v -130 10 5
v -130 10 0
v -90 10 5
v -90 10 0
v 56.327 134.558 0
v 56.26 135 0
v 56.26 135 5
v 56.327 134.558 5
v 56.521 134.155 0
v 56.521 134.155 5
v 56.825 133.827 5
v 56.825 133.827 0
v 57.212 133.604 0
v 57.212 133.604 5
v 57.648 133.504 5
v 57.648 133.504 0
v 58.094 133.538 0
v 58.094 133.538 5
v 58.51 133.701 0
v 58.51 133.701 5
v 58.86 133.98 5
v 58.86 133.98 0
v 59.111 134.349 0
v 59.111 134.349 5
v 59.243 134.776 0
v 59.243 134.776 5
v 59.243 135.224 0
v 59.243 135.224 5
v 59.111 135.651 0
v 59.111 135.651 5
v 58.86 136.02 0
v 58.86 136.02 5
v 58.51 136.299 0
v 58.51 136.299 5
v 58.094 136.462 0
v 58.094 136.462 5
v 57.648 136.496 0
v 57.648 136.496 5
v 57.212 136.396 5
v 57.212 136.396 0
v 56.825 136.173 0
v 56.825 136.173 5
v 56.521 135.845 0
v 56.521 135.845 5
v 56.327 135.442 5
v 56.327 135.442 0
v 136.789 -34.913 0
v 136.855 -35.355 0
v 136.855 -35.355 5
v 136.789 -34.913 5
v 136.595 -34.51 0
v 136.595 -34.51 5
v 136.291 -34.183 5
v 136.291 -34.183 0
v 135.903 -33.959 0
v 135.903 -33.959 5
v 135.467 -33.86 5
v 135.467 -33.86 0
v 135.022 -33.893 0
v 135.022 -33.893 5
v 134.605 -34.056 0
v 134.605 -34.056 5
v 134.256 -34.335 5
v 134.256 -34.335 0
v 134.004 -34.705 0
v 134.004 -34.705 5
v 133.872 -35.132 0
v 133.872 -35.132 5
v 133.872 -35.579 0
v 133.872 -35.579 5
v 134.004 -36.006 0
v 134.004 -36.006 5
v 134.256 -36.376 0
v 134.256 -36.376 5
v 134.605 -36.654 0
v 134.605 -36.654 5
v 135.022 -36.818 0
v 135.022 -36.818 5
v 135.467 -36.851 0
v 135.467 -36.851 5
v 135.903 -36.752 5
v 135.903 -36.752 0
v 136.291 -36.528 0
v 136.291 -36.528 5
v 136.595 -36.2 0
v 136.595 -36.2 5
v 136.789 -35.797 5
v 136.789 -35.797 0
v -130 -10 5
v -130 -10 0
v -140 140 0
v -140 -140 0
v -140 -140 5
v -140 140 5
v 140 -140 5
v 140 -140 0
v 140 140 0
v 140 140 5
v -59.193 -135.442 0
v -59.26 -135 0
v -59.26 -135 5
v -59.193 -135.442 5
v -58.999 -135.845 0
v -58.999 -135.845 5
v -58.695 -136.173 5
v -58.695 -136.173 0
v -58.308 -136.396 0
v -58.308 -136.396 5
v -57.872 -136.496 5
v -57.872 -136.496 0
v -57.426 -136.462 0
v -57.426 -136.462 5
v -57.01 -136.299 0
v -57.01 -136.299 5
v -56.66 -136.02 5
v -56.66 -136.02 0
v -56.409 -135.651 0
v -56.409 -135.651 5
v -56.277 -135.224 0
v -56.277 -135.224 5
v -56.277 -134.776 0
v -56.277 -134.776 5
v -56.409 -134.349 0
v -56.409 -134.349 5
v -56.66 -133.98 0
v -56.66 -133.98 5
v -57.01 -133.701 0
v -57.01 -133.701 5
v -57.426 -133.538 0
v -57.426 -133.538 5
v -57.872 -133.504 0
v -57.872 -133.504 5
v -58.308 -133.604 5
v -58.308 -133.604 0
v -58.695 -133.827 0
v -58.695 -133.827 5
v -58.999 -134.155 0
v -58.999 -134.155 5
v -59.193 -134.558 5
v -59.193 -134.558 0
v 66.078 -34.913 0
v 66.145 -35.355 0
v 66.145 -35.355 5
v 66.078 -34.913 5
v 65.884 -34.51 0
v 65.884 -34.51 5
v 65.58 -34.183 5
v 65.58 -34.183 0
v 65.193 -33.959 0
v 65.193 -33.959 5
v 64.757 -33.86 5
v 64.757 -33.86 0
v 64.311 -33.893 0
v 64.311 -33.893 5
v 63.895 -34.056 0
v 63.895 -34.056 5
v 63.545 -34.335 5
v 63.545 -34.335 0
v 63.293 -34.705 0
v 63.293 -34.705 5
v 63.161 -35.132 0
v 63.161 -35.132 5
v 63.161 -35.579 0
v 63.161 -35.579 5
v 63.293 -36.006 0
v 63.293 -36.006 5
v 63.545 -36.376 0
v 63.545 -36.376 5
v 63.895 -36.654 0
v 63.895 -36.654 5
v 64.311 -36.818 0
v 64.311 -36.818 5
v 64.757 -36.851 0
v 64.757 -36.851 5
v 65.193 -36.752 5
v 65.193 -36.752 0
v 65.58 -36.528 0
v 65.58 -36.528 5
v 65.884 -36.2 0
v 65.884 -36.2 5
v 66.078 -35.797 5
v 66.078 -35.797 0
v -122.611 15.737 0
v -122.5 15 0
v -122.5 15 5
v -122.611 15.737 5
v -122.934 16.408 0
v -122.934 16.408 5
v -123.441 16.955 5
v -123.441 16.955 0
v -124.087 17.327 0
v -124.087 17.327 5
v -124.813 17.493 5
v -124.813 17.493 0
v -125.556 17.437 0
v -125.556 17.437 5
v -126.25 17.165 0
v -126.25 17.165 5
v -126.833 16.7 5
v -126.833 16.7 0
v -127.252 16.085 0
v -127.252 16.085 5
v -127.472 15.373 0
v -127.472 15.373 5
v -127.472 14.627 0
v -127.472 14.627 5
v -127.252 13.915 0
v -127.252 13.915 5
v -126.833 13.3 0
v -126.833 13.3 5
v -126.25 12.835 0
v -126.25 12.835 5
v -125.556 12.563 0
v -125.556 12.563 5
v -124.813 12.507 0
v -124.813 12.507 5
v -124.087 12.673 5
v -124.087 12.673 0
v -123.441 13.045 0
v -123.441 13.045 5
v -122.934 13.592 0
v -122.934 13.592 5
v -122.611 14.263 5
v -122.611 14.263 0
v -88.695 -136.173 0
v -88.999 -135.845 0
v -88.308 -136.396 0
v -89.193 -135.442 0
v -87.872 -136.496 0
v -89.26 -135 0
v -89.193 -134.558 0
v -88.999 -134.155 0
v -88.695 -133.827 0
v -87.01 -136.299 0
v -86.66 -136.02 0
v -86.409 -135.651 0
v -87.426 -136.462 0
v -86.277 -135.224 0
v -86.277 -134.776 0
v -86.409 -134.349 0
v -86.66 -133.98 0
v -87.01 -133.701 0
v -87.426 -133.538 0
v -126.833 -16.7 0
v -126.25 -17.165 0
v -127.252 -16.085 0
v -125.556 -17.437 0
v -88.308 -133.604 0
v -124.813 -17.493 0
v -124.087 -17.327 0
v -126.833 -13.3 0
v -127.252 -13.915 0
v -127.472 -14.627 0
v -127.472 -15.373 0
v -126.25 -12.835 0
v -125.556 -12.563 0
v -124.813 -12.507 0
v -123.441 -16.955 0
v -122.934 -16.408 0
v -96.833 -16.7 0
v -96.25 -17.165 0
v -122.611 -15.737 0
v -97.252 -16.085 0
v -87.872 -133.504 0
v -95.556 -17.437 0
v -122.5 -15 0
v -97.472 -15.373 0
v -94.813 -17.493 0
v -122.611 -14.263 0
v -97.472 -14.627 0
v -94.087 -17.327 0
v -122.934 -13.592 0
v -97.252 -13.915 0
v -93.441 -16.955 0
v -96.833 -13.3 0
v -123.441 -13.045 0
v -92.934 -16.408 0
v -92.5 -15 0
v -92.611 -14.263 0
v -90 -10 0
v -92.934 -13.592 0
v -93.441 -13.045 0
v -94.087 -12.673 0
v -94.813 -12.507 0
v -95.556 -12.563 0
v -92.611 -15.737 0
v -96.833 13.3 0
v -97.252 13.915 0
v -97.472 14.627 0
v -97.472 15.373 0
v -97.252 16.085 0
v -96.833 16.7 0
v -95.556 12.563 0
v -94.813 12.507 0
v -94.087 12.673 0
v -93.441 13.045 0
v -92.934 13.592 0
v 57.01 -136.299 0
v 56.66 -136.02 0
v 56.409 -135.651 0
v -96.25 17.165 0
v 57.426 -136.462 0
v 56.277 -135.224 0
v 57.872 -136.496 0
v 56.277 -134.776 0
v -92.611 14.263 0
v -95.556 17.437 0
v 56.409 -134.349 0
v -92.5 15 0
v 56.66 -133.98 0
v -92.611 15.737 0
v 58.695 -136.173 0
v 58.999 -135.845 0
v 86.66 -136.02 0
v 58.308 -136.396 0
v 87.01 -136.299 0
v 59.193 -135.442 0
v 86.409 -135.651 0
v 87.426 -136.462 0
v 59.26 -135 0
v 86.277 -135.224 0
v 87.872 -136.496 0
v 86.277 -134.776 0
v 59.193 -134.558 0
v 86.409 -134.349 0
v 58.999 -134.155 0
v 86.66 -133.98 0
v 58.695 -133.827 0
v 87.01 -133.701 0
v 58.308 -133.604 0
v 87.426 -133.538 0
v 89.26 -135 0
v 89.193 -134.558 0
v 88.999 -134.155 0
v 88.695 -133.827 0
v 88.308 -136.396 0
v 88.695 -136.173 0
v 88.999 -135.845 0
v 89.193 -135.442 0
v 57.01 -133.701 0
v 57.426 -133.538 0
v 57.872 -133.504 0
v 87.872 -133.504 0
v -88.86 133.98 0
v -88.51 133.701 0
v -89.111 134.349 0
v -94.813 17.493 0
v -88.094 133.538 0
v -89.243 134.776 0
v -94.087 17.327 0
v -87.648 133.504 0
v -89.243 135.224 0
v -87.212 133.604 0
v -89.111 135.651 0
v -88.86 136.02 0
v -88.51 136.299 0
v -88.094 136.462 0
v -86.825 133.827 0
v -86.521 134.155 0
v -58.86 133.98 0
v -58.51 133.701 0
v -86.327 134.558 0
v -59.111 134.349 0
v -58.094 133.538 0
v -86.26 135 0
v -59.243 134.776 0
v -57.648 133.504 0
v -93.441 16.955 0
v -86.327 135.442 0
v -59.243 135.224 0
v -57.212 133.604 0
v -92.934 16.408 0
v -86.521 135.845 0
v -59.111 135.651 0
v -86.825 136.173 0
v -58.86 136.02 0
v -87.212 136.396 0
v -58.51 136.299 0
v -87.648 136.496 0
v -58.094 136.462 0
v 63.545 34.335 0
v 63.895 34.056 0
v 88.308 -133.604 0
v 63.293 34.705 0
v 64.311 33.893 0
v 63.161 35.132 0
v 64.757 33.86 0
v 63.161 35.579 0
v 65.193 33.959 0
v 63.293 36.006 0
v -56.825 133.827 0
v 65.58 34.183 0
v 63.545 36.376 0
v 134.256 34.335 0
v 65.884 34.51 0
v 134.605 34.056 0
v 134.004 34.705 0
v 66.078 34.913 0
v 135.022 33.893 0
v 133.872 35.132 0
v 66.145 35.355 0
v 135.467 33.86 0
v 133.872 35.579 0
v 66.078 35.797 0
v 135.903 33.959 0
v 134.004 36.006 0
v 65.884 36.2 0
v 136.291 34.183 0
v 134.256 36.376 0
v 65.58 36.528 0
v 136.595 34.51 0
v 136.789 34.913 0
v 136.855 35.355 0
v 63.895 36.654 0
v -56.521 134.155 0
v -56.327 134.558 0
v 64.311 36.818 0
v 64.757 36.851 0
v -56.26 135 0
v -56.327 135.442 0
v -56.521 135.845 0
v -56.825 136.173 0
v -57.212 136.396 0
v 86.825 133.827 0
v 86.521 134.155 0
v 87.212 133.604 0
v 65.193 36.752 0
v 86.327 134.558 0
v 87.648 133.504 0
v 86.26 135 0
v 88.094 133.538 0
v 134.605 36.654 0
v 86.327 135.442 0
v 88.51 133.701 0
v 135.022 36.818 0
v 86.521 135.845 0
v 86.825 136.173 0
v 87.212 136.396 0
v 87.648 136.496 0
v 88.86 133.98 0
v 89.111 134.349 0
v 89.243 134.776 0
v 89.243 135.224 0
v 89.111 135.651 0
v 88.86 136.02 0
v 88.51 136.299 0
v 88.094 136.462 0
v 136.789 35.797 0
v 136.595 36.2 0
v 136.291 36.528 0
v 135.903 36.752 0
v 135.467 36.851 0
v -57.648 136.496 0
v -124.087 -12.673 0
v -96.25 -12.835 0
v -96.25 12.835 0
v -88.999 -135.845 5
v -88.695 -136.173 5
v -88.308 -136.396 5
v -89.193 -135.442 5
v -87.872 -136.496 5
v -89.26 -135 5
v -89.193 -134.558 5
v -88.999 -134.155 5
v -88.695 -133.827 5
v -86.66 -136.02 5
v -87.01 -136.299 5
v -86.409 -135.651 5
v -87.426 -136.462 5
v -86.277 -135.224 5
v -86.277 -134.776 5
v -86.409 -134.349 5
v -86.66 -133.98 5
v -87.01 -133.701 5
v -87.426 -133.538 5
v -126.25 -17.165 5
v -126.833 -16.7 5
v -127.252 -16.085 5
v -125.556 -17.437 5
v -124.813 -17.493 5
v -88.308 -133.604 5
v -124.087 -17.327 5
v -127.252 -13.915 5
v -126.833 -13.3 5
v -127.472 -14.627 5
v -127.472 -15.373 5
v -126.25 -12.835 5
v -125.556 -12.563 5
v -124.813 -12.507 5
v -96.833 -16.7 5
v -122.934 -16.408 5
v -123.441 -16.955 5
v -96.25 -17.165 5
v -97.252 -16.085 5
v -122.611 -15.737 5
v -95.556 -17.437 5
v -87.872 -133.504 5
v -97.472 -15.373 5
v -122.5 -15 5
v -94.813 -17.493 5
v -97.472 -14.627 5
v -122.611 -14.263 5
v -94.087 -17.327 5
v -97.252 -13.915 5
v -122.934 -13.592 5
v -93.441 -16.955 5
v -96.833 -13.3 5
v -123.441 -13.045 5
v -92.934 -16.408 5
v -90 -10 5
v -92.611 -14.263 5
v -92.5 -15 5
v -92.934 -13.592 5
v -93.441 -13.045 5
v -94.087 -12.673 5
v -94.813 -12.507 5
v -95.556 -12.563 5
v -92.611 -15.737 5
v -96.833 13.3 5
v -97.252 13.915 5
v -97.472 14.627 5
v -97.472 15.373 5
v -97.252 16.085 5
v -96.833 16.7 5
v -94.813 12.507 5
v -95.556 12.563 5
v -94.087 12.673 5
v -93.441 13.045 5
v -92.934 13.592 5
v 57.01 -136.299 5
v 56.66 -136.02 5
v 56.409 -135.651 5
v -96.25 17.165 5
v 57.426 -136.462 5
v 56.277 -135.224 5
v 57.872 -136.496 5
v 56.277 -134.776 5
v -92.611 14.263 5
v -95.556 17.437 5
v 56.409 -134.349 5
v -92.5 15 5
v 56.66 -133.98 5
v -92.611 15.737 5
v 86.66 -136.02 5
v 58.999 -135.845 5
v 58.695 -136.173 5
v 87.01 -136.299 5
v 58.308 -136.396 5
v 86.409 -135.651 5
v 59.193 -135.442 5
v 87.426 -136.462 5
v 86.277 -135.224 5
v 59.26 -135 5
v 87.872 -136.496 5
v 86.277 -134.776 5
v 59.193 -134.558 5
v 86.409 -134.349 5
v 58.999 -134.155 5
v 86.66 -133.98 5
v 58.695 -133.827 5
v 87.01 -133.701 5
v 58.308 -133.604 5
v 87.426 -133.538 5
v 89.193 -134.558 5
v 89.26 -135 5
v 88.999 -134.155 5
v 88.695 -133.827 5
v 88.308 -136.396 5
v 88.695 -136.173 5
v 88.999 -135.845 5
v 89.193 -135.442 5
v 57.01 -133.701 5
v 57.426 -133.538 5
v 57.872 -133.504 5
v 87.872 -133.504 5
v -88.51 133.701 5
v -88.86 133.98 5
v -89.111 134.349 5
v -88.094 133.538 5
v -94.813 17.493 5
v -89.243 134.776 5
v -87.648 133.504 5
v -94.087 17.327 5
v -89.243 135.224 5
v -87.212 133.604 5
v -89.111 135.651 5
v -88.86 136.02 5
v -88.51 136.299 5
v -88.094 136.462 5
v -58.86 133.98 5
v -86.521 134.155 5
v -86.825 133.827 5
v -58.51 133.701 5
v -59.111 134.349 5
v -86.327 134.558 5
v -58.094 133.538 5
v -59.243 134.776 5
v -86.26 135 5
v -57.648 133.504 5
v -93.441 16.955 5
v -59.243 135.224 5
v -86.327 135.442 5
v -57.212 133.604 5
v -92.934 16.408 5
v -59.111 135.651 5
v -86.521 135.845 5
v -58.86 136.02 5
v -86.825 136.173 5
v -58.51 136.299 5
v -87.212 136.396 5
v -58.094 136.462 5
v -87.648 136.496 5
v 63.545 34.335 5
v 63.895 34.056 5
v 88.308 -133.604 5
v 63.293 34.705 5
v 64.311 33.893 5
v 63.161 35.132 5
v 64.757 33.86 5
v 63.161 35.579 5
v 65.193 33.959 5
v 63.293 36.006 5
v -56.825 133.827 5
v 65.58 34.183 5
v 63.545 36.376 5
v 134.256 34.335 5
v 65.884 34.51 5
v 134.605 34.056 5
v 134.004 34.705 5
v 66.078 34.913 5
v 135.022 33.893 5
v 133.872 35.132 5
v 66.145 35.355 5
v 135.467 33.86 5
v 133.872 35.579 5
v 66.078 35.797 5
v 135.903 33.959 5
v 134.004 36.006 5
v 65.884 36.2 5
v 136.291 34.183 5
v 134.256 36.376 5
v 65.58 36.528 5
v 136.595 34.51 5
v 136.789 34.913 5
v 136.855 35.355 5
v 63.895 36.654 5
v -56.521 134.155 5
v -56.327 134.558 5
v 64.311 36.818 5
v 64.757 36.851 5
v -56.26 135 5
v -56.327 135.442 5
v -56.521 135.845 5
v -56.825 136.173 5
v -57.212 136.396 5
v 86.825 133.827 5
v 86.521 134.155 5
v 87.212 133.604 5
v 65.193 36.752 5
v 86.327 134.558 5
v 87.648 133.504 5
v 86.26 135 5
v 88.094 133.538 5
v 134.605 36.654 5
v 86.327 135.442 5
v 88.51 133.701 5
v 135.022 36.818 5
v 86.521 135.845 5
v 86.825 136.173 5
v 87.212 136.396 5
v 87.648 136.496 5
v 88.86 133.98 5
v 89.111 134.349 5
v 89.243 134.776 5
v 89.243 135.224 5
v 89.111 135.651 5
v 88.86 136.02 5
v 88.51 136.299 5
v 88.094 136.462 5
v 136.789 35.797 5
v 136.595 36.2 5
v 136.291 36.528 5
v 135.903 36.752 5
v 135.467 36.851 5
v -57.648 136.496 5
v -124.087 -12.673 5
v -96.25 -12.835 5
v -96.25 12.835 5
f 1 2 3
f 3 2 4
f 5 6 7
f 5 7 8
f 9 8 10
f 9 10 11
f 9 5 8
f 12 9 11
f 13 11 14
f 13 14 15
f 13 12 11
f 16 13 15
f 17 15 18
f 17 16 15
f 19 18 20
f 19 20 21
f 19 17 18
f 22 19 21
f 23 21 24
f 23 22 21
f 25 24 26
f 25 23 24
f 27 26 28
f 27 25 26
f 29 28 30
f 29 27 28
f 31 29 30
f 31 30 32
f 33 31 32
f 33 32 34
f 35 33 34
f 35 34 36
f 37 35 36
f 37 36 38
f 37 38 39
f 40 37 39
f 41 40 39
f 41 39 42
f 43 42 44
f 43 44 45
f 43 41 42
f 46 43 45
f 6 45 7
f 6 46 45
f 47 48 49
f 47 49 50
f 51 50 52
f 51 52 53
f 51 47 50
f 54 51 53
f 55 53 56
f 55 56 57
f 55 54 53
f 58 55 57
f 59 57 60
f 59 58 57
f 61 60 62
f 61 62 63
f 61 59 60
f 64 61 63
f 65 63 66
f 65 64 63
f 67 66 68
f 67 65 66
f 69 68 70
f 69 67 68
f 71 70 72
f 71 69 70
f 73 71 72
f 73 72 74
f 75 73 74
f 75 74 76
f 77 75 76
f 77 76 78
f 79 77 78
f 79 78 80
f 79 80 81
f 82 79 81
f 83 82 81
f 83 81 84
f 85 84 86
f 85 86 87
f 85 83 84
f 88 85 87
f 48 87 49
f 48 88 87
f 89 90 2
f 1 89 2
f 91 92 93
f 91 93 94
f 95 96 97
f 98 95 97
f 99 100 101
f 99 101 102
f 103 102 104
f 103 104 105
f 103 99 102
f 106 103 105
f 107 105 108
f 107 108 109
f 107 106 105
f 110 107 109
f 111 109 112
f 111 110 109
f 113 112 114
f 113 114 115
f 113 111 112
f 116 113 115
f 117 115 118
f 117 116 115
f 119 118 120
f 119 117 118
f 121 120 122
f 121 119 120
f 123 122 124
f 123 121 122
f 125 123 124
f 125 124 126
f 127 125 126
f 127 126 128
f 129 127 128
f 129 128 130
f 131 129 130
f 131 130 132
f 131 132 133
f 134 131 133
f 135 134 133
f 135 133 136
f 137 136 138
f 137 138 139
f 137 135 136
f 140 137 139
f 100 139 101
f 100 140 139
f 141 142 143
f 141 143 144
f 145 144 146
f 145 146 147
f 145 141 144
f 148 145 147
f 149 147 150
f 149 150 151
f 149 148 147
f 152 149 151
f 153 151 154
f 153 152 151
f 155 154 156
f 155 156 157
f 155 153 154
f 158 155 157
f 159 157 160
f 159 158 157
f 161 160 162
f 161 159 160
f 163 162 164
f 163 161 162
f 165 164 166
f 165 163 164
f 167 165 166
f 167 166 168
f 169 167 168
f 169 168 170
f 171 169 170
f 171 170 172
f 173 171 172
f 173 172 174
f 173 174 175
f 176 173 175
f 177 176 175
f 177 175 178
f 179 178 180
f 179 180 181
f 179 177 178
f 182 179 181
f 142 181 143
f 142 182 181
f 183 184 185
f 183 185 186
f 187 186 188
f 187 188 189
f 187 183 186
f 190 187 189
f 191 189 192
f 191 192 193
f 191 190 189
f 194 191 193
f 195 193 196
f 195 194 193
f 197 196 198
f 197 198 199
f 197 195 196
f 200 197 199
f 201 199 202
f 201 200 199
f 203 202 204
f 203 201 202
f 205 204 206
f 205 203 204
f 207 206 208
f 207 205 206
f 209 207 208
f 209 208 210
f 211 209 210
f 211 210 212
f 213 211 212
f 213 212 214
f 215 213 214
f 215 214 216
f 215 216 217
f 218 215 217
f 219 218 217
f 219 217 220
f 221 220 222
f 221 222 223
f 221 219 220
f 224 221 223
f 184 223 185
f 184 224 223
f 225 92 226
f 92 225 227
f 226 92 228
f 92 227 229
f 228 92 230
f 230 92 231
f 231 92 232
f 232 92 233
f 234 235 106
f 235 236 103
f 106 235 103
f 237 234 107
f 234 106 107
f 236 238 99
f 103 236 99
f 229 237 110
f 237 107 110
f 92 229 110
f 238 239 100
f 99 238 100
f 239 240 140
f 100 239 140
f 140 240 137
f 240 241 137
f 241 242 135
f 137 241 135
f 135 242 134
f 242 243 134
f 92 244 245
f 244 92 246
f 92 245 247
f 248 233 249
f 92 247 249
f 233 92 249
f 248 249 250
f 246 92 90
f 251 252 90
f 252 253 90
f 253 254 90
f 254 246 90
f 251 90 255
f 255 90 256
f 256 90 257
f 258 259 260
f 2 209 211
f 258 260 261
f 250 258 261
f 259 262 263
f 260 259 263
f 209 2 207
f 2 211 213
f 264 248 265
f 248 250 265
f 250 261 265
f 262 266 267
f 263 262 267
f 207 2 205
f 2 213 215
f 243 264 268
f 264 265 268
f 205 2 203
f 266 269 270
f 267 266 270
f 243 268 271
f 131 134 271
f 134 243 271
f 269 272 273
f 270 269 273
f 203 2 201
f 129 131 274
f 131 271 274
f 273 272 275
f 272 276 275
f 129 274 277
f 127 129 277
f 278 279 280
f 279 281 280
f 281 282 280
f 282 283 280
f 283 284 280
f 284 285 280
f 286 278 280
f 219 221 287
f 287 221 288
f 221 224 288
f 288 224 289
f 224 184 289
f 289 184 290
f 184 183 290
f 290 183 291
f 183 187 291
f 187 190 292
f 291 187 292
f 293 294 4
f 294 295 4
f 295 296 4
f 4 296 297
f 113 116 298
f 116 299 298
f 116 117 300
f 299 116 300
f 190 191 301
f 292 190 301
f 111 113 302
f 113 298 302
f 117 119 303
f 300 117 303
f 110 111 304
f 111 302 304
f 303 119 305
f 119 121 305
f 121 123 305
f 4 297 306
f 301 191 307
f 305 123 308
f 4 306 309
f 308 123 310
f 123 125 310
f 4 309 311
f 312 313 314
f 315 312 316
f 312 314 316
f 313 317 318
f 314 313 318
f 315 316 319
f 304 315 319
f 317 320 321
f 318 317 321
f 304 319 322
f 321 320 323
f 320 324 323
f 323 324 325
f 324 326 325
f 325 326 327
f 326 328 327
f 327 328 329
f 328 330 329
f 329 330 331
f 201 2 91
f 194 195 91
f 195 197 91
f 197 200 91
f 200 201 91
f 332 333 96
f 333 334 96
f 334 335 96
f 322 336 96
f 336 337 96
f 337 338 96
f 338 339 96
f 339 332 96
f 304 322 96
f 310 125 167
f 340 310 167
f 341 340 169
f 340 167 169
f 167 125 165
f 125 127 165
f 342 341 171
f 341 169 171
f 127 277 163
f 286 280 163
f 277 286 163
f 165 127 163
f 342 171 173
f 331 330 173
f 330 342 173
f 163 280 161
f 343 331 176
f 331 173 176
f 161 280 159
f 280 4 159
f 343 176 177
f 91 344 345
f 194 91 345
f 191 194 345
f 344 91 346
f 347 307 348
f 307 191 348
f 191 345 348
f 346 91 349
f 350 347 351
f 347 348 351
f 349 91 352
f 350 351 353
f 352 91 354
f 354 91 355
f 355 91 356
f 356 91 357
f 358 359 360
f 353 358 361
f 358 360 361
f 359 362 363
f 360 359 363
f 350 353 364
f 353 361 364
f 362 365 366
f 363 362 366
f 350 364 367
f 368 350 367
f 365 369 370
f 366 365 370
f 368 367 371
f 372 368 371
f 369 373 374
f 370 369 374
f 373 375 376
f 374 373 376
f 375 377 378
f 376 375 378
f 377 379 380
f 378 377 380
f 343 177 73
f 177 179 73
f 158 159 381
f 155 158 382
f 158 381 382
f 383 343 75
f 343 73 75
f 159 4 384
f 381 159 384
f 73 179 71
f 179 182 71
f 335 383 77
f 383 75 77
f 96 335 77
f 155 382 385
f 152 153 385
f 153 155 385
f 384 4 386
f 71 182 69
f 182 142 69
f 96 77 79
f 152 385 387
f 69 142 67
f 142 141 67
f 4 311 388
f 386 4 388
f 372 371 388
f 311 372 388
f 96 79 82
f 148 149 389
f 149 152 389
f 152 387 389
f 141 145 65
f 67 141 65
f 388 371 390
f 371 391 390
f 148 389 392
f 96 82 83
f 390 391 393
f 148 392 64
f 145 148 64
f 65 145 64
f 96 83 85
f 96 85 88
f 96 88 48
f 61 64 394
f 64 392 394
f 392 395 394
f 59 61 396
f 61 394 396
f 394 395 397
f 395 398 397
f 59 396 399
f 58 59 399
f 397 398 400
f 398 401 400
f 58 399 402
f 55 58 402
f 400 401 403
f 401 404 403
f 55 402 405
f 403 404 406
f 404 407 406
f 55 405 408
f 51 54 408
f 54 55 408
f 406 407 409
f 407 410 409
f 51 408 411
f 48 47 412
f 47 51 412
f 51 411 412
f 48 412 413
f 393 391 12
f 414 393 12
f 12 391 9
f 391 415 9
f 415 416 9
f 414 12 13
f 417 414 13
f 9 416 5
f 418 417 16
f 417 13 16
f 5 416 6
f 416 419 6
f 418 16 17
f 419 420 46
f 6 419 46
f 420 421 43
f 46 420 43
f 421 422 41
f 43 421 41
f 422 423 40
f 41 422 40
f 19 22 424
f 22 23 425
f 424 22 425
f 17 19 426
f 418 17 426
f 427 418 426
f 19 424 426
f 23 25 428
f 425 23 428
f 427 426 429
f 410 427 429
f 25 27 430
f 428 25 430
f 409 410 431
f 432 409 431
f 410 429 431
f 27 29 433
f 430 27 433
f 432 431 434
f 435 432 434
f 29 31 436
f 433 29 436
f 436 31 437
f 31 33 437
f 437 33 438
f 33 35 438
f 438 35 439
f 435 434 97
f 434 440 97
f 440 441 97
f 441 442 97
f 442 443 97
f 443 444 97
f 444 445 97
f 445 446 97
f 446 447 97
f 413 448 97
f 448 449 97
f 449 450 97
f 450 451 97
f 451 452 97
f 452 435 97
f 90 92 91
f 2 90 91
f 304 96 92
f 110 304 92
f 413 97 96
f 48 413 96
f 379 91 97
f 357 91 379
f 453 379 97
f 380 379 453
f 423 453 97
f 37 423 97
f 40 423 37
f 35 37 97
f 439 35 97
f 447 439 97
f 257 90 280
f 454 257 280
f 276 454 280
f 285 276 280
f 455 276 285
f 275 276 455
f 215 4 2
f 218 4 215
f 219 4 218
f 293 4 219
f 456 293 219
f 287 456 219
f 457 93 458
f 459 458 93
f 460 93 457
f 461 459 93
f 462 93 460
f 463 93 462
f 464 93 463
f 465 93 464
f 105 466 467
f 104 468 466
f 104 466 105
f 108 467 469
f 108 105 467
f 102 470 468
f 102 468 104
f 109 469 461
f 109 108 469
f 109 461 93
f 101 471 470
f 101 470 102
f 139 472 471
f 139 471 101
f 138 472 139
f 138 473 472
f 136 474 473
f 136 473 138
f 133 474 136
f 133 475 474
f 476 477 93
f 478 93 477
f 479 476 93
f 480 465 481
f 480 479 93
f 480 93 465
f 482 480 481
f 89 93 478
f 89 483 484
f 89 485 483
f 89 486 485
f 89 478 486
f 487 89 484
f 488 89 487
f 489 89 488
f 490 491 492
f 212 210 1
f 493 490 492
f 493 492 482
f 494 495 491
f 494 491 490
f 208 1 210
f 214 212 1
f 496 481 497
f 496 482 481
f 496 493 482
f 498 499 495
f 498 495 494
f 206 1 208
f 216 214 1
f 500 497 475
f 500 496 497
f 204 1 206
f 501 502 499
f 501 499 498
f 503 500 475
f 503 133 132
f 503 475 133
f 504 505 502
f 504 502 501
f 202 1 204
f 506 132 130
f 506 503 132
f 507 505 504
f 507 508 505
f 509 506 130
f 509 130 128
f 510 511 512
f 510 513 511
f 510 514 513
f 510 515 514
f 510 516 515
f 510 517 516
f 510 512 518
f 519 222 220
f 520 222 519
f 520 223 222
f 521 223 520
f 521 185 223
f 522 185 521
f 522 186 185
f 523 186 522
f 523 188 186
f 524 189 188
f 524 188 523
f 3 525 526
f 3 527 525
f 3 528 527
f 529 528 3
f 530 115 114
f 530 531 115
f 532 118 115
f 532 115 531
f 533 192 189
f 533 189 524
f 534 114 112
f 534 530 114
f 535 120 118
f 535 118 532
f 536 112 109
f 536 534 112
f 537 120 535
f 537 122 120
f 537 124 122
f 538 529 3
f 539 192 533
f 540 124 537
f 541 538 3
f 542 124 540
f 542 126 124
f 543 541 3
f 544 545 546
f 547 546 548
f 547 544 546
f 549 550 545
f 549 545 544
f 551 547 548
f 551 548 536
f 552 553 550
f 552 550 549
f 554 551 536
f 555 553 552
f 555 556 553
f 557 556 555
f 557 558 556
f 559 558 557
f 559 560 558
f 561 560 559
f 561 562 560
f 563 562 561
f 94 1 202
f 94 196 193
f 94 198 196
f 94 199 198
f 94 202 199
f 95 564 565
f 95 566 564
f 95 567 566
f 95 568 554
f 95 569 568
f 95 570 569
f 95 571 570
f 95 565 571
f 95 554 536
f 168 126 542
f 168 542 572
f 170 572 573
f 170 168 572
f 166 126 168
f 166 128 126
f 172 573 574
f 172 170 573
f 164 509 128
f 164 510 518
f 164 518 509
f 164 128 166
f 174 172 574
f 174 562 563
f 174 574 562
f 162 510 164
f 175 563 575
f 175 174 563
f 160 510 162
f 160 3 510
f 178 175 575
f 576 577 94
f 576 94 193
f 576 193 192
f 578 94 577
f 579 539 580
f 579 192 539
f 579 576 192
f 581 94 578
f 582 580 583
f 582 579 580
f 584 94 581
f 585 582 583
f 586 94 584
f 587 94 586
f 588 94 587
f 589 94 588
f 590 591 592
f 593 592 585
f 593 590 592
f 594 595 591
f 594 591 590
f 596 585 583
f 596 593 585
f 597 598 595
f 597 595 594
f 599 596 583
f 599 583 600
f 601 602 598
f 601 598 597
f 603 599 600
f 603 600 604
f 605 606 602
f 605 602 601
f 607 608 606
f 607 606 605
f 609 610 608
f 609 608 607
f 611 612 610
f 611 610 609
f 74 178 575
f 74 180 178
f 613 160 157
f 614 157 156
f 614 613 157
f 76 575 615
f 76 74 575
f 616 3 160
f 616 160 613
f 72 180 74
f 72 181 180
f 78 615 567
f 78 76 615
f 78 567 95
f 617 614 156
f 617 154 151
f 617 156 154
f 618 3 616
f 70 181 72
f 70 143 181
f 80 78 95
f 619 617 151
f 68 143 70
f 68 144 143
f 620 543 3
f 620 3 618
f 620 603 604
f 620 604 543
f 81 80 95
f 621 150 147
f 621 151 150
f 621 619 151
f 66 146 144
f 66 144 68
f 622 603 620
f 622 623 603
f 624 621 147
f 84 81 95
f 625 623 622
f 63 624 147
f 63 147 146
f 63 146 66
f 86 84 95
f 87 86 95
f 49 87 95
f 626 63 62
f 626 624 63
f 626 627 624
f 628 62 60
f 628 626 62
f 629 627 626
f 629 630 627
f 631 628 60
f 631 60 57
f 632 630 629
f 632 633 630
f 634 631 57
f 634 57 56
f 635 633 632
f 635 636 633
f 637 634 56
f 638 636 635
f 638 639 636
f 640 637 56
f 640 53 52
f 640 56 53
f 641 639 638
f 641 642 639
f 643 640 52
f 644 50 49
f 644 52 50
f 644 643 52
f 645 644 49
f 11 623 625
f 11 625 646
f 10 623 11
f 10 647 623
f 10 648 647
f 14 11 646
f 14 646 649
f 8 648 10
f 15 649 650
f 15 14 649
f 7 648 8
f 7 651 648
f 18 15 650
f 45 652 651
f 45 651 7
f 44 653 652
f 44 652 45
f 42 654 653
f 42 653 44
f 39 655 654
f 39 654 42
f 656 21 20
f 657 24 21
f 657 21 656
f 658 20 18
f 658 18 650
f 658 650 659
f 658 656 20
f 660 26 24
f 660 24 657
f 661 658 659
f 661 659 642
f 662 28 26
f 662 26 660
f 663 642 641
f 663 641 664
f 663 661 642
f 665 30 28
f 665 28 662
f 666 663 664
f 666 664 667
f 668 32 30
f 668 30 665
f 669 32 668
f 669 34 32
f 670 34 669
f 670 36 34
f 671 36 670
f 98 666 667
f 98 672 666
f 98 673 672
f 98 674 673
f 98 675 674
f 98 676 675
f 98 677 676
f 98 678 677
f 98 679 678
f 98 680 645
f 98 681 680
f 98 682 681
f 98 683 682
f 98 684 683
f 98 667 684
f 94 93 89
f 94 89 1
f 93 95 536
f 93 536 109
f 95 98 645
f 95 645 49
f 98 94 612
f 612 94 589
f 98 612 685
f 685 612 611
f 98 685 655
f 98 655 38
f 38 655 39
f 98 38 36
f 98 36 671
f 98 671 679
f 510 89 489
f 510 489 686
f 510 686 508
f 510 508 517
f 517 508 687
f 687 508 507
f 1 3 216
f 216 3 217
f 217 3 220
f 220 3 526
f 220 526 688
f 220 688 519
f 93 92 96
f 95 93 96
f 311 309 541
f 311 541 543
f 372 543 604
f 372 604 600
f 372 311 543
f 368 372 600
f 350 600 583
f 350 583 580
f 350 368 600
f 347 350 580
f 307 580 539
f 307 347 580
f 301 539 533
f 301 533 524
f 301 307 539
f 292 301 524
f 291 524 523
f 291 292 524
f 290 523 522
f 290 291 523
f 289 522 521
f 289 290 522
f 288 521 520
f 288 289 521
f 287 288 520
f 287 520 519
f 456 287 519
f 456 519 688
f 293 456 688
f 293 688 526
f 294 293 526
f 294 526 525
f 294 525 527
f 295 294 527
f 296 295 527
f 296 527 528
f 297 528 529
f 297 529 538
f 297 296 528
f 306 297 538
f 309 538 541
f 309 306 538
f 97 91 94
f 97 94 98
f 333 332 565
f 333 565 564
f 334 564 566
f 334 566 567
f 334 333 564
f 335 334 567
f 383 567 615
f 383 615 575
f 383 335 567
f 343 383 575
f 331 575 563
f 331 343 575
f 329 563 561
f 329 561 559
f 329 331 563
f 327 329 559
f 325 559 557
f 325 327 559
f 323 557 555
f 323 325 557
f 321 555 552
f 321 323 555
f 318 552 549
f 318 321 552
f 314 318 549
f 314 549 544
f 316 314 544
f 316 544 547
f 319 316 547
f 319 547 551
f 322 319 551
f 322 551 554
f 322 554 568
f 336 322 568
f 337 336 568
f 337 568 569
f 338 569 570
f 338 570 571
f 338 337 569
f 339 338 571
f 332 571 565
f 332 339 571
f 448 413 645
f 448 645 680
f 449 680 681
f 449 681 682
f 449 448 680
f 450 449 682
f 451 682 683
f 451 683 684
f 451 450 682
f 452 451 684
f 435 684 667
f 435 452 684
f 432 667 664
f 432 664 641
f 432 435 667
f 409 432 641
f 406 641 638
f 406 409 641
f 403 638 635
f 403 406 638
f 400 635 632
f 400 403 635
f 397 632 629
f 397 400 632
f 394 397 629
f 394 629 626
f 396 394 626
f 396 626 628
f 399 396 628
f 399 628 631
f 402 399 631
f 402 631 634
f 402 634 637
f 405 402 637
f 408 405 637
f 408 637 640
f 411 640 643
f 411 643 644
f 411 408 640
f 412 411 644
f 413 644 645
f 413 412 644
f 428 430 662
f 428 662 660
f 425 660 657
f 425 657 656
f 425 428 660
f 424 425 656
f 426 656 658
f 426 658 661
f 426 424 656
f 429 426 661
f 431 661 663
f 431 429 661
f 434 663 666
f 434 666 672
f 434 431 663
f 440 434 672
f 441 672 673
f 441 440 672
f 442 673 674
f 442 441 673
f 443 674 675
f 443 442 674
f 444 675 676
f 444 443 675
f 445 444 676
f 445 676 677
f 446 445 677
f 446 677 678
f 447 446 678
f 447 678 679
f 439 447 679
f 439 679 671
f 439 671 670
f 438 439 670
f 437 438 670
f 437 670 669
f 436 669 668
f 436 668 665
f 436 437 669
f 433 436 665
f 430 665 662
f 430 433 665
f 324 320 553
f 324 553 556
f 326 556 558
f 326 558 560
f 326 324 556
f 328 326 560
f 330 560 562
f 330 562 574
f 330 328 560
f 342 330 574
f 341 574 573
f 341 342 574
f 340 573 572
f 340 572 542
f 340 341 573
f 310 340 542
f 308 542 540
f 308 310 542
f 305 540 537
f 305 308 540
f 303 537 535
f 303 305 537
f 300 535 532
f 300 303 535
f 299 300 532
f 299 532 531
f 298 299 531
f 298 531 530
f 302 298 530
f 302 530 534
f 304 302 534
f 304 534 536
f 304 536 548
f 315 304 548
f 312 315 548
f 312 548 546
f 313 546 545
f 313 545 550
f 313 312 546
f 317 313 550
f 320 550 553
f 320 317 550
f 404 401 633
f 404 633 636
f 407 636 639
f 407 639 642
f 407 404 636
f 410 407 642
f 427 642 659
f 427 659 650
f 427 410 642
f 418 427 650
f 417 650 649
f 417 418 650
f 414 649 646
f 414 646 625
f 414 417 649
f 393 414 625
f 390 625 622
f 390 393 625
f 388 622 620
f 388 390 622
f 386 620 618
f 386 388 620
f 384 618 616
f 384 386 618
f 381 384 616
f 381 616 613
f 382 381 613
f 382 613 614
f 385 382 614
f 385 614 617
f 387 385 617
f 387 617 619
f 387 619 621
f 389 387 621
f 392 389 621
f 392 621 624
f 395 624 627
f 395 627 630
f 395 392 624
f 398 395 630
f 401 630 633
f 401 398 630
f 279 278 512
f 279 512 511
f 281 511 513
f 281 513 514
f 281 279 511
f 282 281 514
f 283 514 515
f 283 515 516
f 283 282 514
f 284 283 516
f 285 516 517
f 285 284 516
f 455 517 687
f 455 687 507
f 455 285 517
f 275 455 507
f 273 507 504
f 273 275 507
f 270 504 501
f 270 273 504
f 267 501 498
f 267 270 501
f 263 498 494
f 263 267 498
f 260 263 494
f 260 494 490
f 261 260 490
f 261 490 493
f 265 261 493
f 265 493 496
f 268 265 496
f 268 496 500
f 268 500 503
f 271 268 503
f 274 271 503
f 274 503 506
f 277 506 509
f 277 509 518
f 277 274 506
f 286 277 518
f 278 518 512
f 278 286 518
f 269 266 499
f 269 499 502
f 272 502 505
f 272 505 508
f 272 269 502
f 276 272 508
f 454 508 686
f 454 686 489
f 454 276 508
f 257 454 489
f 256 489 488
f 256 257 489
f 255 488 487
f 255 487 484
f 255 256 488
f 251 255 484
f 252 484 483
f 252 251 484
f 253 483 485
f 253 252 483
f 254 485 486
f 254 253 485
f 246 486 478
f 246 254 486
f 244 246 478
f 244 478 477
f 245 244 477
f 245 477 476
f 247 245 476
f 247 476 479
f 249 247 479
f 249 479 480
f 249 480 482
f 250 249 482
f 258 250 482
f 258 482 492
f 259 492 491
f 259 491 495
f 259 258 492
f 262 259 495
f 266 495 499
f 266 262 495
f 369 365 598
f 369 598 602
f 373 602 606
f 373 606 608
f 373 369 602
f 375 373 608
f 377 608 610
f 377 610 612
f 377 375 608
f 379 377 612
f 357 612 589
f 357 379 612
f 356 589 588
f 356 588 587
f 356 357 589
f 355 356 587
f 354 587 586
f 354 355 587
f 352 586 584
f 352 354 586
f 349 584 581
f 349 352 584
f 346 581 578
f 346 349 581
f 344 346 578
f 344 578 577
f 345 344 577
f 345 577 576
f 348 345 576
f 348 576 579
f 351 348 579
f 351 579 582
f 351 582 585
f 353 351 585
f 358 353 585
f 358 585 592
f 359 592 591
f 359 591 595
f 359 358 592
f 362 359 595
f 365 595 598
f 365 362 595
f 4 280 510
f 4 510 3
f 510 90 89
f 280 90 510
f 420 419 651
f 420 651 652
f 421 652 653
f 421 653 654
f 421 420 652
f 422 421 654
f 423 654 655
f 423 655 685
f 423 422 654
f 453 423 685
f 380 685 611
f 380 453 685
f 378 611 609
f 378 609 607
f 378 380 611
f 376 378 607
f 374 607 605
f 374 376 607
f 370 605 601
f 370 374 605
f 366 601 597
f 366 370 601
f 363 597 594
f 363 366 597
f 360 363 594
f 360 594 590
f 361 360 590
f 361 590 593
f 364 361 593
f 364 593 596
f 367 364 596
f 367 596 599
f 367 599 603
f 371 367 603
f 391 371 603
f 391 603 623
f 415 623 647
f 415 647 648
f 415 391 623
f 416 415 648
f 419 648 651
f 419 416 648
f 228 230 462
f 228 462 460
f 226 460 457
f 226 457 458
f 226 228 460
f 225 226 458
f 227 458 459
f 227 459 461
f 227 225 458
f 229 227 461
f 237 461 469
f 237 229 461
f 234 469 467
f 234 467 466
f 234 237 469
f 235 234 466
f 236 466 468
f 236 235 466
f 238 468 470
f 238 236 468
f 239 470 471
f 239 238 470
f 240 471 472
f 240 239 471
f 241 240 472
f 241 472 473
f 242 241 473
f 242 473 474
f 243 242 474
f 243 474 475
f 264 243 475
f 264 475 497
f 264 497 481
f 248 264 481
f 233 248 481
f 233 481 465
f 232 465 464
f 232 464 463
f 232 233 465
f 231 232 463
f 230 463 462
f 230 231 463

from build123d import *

# Parameters (mm, degrees)
SKETCH_1_W      = 280
SKETCH_1_H      = 280
SKETCH_1_R      = 1.5
SKETCH_1_R_2    = 2.5
SKETCH_1_W_2    = 40
SKETCH_1_H_2    = 20
EXTRUDE_1_DEPTH = 5


with BuildPart() as part:
    # 草图1 → 凸台-拉伸1 (new body)
    with BuildSketch(Plane.XY):
        Rectangle(SKETCH_1_W, SKETCH_1_H)
        with Locations((-87.76, 135)):
            Circle(SKETCH_1_R, mode=Mode.SUBTRACT)
        with Locations((-57.76, 135)):
            Circle(SKETCH_1_R, mode=Mode.SUBTRACT)
        with Locations(Location((57.76, 135, 0), (0, 0, 180))):
            Circle(SKETCH_1_R, mode=Mode.SUBTRACT)
        with Locations(Location((87.76, 135, 0), (0, 0, 180))):
            Circle(SKETCH_1_R, mode=Mode.SUBTRACT)
        with Locations((87.76, -135)):
            Circle(SKETCH_1_R, mode=Mode.SUBTRACT)
        with Locations((57.76, -135)):
            Circle(SKETCH_1_R, mode=Mode.SUBTRACT)
        with Locations(Location((-57.76, -135, 0), (0, 0, 180))):
            Circle(SKETCH_1_R, mode=Mode.SUBTRACT)
        with Locations(Location((-87.76, -135, 0), (0, 0, 180))):
            Circle(SKETCH_1_R, mode=Mode.SUBTRACT)
        with Locations((64.644660941, 35.355339059)):
            Circle(SKETCH_1_R, mode=Mode.SUBTRACT)
        with Locations((135.355339059, 35.355339059)):
            Circle(SKETCH_1_R, mode=Mode.SUBTRACT)
        with Locations((64.644660941, -35.355339059)):
            Circle(SKETCH_1_R, mode=Mode.SUBTRACT)
        with Locations((135.355339059, -35.355339059)):
            Circle(SKETCH_1_R, mode=Mode.SUBTRACT)
        with Locations((-95, 15)):
            Circle(SKETCH_1_R_2, mode=Mode.SUBTRACT)
        with Locations((-125, 15)):
            Circle(SKETCH_1_R_2, mode=Mode.SUBTRACT)
        with Locations((-125, -15)):
            Circle(SKETCH_1_R_2, mode=Mode.SUBTRACT)
        with Locations((-95, -15)):
            Circle(SKETCH_1_R_2, mode=Mode.SUBTRACT)
        with Locations((-110, 0)):
            Rectangle(SKETCH_1_W_2, SKETCH_1_H_2, mode=Mode.SUBTRACT)
    extrude(amount=EXTRUDE_1_DEPTH)


solid = part.part
